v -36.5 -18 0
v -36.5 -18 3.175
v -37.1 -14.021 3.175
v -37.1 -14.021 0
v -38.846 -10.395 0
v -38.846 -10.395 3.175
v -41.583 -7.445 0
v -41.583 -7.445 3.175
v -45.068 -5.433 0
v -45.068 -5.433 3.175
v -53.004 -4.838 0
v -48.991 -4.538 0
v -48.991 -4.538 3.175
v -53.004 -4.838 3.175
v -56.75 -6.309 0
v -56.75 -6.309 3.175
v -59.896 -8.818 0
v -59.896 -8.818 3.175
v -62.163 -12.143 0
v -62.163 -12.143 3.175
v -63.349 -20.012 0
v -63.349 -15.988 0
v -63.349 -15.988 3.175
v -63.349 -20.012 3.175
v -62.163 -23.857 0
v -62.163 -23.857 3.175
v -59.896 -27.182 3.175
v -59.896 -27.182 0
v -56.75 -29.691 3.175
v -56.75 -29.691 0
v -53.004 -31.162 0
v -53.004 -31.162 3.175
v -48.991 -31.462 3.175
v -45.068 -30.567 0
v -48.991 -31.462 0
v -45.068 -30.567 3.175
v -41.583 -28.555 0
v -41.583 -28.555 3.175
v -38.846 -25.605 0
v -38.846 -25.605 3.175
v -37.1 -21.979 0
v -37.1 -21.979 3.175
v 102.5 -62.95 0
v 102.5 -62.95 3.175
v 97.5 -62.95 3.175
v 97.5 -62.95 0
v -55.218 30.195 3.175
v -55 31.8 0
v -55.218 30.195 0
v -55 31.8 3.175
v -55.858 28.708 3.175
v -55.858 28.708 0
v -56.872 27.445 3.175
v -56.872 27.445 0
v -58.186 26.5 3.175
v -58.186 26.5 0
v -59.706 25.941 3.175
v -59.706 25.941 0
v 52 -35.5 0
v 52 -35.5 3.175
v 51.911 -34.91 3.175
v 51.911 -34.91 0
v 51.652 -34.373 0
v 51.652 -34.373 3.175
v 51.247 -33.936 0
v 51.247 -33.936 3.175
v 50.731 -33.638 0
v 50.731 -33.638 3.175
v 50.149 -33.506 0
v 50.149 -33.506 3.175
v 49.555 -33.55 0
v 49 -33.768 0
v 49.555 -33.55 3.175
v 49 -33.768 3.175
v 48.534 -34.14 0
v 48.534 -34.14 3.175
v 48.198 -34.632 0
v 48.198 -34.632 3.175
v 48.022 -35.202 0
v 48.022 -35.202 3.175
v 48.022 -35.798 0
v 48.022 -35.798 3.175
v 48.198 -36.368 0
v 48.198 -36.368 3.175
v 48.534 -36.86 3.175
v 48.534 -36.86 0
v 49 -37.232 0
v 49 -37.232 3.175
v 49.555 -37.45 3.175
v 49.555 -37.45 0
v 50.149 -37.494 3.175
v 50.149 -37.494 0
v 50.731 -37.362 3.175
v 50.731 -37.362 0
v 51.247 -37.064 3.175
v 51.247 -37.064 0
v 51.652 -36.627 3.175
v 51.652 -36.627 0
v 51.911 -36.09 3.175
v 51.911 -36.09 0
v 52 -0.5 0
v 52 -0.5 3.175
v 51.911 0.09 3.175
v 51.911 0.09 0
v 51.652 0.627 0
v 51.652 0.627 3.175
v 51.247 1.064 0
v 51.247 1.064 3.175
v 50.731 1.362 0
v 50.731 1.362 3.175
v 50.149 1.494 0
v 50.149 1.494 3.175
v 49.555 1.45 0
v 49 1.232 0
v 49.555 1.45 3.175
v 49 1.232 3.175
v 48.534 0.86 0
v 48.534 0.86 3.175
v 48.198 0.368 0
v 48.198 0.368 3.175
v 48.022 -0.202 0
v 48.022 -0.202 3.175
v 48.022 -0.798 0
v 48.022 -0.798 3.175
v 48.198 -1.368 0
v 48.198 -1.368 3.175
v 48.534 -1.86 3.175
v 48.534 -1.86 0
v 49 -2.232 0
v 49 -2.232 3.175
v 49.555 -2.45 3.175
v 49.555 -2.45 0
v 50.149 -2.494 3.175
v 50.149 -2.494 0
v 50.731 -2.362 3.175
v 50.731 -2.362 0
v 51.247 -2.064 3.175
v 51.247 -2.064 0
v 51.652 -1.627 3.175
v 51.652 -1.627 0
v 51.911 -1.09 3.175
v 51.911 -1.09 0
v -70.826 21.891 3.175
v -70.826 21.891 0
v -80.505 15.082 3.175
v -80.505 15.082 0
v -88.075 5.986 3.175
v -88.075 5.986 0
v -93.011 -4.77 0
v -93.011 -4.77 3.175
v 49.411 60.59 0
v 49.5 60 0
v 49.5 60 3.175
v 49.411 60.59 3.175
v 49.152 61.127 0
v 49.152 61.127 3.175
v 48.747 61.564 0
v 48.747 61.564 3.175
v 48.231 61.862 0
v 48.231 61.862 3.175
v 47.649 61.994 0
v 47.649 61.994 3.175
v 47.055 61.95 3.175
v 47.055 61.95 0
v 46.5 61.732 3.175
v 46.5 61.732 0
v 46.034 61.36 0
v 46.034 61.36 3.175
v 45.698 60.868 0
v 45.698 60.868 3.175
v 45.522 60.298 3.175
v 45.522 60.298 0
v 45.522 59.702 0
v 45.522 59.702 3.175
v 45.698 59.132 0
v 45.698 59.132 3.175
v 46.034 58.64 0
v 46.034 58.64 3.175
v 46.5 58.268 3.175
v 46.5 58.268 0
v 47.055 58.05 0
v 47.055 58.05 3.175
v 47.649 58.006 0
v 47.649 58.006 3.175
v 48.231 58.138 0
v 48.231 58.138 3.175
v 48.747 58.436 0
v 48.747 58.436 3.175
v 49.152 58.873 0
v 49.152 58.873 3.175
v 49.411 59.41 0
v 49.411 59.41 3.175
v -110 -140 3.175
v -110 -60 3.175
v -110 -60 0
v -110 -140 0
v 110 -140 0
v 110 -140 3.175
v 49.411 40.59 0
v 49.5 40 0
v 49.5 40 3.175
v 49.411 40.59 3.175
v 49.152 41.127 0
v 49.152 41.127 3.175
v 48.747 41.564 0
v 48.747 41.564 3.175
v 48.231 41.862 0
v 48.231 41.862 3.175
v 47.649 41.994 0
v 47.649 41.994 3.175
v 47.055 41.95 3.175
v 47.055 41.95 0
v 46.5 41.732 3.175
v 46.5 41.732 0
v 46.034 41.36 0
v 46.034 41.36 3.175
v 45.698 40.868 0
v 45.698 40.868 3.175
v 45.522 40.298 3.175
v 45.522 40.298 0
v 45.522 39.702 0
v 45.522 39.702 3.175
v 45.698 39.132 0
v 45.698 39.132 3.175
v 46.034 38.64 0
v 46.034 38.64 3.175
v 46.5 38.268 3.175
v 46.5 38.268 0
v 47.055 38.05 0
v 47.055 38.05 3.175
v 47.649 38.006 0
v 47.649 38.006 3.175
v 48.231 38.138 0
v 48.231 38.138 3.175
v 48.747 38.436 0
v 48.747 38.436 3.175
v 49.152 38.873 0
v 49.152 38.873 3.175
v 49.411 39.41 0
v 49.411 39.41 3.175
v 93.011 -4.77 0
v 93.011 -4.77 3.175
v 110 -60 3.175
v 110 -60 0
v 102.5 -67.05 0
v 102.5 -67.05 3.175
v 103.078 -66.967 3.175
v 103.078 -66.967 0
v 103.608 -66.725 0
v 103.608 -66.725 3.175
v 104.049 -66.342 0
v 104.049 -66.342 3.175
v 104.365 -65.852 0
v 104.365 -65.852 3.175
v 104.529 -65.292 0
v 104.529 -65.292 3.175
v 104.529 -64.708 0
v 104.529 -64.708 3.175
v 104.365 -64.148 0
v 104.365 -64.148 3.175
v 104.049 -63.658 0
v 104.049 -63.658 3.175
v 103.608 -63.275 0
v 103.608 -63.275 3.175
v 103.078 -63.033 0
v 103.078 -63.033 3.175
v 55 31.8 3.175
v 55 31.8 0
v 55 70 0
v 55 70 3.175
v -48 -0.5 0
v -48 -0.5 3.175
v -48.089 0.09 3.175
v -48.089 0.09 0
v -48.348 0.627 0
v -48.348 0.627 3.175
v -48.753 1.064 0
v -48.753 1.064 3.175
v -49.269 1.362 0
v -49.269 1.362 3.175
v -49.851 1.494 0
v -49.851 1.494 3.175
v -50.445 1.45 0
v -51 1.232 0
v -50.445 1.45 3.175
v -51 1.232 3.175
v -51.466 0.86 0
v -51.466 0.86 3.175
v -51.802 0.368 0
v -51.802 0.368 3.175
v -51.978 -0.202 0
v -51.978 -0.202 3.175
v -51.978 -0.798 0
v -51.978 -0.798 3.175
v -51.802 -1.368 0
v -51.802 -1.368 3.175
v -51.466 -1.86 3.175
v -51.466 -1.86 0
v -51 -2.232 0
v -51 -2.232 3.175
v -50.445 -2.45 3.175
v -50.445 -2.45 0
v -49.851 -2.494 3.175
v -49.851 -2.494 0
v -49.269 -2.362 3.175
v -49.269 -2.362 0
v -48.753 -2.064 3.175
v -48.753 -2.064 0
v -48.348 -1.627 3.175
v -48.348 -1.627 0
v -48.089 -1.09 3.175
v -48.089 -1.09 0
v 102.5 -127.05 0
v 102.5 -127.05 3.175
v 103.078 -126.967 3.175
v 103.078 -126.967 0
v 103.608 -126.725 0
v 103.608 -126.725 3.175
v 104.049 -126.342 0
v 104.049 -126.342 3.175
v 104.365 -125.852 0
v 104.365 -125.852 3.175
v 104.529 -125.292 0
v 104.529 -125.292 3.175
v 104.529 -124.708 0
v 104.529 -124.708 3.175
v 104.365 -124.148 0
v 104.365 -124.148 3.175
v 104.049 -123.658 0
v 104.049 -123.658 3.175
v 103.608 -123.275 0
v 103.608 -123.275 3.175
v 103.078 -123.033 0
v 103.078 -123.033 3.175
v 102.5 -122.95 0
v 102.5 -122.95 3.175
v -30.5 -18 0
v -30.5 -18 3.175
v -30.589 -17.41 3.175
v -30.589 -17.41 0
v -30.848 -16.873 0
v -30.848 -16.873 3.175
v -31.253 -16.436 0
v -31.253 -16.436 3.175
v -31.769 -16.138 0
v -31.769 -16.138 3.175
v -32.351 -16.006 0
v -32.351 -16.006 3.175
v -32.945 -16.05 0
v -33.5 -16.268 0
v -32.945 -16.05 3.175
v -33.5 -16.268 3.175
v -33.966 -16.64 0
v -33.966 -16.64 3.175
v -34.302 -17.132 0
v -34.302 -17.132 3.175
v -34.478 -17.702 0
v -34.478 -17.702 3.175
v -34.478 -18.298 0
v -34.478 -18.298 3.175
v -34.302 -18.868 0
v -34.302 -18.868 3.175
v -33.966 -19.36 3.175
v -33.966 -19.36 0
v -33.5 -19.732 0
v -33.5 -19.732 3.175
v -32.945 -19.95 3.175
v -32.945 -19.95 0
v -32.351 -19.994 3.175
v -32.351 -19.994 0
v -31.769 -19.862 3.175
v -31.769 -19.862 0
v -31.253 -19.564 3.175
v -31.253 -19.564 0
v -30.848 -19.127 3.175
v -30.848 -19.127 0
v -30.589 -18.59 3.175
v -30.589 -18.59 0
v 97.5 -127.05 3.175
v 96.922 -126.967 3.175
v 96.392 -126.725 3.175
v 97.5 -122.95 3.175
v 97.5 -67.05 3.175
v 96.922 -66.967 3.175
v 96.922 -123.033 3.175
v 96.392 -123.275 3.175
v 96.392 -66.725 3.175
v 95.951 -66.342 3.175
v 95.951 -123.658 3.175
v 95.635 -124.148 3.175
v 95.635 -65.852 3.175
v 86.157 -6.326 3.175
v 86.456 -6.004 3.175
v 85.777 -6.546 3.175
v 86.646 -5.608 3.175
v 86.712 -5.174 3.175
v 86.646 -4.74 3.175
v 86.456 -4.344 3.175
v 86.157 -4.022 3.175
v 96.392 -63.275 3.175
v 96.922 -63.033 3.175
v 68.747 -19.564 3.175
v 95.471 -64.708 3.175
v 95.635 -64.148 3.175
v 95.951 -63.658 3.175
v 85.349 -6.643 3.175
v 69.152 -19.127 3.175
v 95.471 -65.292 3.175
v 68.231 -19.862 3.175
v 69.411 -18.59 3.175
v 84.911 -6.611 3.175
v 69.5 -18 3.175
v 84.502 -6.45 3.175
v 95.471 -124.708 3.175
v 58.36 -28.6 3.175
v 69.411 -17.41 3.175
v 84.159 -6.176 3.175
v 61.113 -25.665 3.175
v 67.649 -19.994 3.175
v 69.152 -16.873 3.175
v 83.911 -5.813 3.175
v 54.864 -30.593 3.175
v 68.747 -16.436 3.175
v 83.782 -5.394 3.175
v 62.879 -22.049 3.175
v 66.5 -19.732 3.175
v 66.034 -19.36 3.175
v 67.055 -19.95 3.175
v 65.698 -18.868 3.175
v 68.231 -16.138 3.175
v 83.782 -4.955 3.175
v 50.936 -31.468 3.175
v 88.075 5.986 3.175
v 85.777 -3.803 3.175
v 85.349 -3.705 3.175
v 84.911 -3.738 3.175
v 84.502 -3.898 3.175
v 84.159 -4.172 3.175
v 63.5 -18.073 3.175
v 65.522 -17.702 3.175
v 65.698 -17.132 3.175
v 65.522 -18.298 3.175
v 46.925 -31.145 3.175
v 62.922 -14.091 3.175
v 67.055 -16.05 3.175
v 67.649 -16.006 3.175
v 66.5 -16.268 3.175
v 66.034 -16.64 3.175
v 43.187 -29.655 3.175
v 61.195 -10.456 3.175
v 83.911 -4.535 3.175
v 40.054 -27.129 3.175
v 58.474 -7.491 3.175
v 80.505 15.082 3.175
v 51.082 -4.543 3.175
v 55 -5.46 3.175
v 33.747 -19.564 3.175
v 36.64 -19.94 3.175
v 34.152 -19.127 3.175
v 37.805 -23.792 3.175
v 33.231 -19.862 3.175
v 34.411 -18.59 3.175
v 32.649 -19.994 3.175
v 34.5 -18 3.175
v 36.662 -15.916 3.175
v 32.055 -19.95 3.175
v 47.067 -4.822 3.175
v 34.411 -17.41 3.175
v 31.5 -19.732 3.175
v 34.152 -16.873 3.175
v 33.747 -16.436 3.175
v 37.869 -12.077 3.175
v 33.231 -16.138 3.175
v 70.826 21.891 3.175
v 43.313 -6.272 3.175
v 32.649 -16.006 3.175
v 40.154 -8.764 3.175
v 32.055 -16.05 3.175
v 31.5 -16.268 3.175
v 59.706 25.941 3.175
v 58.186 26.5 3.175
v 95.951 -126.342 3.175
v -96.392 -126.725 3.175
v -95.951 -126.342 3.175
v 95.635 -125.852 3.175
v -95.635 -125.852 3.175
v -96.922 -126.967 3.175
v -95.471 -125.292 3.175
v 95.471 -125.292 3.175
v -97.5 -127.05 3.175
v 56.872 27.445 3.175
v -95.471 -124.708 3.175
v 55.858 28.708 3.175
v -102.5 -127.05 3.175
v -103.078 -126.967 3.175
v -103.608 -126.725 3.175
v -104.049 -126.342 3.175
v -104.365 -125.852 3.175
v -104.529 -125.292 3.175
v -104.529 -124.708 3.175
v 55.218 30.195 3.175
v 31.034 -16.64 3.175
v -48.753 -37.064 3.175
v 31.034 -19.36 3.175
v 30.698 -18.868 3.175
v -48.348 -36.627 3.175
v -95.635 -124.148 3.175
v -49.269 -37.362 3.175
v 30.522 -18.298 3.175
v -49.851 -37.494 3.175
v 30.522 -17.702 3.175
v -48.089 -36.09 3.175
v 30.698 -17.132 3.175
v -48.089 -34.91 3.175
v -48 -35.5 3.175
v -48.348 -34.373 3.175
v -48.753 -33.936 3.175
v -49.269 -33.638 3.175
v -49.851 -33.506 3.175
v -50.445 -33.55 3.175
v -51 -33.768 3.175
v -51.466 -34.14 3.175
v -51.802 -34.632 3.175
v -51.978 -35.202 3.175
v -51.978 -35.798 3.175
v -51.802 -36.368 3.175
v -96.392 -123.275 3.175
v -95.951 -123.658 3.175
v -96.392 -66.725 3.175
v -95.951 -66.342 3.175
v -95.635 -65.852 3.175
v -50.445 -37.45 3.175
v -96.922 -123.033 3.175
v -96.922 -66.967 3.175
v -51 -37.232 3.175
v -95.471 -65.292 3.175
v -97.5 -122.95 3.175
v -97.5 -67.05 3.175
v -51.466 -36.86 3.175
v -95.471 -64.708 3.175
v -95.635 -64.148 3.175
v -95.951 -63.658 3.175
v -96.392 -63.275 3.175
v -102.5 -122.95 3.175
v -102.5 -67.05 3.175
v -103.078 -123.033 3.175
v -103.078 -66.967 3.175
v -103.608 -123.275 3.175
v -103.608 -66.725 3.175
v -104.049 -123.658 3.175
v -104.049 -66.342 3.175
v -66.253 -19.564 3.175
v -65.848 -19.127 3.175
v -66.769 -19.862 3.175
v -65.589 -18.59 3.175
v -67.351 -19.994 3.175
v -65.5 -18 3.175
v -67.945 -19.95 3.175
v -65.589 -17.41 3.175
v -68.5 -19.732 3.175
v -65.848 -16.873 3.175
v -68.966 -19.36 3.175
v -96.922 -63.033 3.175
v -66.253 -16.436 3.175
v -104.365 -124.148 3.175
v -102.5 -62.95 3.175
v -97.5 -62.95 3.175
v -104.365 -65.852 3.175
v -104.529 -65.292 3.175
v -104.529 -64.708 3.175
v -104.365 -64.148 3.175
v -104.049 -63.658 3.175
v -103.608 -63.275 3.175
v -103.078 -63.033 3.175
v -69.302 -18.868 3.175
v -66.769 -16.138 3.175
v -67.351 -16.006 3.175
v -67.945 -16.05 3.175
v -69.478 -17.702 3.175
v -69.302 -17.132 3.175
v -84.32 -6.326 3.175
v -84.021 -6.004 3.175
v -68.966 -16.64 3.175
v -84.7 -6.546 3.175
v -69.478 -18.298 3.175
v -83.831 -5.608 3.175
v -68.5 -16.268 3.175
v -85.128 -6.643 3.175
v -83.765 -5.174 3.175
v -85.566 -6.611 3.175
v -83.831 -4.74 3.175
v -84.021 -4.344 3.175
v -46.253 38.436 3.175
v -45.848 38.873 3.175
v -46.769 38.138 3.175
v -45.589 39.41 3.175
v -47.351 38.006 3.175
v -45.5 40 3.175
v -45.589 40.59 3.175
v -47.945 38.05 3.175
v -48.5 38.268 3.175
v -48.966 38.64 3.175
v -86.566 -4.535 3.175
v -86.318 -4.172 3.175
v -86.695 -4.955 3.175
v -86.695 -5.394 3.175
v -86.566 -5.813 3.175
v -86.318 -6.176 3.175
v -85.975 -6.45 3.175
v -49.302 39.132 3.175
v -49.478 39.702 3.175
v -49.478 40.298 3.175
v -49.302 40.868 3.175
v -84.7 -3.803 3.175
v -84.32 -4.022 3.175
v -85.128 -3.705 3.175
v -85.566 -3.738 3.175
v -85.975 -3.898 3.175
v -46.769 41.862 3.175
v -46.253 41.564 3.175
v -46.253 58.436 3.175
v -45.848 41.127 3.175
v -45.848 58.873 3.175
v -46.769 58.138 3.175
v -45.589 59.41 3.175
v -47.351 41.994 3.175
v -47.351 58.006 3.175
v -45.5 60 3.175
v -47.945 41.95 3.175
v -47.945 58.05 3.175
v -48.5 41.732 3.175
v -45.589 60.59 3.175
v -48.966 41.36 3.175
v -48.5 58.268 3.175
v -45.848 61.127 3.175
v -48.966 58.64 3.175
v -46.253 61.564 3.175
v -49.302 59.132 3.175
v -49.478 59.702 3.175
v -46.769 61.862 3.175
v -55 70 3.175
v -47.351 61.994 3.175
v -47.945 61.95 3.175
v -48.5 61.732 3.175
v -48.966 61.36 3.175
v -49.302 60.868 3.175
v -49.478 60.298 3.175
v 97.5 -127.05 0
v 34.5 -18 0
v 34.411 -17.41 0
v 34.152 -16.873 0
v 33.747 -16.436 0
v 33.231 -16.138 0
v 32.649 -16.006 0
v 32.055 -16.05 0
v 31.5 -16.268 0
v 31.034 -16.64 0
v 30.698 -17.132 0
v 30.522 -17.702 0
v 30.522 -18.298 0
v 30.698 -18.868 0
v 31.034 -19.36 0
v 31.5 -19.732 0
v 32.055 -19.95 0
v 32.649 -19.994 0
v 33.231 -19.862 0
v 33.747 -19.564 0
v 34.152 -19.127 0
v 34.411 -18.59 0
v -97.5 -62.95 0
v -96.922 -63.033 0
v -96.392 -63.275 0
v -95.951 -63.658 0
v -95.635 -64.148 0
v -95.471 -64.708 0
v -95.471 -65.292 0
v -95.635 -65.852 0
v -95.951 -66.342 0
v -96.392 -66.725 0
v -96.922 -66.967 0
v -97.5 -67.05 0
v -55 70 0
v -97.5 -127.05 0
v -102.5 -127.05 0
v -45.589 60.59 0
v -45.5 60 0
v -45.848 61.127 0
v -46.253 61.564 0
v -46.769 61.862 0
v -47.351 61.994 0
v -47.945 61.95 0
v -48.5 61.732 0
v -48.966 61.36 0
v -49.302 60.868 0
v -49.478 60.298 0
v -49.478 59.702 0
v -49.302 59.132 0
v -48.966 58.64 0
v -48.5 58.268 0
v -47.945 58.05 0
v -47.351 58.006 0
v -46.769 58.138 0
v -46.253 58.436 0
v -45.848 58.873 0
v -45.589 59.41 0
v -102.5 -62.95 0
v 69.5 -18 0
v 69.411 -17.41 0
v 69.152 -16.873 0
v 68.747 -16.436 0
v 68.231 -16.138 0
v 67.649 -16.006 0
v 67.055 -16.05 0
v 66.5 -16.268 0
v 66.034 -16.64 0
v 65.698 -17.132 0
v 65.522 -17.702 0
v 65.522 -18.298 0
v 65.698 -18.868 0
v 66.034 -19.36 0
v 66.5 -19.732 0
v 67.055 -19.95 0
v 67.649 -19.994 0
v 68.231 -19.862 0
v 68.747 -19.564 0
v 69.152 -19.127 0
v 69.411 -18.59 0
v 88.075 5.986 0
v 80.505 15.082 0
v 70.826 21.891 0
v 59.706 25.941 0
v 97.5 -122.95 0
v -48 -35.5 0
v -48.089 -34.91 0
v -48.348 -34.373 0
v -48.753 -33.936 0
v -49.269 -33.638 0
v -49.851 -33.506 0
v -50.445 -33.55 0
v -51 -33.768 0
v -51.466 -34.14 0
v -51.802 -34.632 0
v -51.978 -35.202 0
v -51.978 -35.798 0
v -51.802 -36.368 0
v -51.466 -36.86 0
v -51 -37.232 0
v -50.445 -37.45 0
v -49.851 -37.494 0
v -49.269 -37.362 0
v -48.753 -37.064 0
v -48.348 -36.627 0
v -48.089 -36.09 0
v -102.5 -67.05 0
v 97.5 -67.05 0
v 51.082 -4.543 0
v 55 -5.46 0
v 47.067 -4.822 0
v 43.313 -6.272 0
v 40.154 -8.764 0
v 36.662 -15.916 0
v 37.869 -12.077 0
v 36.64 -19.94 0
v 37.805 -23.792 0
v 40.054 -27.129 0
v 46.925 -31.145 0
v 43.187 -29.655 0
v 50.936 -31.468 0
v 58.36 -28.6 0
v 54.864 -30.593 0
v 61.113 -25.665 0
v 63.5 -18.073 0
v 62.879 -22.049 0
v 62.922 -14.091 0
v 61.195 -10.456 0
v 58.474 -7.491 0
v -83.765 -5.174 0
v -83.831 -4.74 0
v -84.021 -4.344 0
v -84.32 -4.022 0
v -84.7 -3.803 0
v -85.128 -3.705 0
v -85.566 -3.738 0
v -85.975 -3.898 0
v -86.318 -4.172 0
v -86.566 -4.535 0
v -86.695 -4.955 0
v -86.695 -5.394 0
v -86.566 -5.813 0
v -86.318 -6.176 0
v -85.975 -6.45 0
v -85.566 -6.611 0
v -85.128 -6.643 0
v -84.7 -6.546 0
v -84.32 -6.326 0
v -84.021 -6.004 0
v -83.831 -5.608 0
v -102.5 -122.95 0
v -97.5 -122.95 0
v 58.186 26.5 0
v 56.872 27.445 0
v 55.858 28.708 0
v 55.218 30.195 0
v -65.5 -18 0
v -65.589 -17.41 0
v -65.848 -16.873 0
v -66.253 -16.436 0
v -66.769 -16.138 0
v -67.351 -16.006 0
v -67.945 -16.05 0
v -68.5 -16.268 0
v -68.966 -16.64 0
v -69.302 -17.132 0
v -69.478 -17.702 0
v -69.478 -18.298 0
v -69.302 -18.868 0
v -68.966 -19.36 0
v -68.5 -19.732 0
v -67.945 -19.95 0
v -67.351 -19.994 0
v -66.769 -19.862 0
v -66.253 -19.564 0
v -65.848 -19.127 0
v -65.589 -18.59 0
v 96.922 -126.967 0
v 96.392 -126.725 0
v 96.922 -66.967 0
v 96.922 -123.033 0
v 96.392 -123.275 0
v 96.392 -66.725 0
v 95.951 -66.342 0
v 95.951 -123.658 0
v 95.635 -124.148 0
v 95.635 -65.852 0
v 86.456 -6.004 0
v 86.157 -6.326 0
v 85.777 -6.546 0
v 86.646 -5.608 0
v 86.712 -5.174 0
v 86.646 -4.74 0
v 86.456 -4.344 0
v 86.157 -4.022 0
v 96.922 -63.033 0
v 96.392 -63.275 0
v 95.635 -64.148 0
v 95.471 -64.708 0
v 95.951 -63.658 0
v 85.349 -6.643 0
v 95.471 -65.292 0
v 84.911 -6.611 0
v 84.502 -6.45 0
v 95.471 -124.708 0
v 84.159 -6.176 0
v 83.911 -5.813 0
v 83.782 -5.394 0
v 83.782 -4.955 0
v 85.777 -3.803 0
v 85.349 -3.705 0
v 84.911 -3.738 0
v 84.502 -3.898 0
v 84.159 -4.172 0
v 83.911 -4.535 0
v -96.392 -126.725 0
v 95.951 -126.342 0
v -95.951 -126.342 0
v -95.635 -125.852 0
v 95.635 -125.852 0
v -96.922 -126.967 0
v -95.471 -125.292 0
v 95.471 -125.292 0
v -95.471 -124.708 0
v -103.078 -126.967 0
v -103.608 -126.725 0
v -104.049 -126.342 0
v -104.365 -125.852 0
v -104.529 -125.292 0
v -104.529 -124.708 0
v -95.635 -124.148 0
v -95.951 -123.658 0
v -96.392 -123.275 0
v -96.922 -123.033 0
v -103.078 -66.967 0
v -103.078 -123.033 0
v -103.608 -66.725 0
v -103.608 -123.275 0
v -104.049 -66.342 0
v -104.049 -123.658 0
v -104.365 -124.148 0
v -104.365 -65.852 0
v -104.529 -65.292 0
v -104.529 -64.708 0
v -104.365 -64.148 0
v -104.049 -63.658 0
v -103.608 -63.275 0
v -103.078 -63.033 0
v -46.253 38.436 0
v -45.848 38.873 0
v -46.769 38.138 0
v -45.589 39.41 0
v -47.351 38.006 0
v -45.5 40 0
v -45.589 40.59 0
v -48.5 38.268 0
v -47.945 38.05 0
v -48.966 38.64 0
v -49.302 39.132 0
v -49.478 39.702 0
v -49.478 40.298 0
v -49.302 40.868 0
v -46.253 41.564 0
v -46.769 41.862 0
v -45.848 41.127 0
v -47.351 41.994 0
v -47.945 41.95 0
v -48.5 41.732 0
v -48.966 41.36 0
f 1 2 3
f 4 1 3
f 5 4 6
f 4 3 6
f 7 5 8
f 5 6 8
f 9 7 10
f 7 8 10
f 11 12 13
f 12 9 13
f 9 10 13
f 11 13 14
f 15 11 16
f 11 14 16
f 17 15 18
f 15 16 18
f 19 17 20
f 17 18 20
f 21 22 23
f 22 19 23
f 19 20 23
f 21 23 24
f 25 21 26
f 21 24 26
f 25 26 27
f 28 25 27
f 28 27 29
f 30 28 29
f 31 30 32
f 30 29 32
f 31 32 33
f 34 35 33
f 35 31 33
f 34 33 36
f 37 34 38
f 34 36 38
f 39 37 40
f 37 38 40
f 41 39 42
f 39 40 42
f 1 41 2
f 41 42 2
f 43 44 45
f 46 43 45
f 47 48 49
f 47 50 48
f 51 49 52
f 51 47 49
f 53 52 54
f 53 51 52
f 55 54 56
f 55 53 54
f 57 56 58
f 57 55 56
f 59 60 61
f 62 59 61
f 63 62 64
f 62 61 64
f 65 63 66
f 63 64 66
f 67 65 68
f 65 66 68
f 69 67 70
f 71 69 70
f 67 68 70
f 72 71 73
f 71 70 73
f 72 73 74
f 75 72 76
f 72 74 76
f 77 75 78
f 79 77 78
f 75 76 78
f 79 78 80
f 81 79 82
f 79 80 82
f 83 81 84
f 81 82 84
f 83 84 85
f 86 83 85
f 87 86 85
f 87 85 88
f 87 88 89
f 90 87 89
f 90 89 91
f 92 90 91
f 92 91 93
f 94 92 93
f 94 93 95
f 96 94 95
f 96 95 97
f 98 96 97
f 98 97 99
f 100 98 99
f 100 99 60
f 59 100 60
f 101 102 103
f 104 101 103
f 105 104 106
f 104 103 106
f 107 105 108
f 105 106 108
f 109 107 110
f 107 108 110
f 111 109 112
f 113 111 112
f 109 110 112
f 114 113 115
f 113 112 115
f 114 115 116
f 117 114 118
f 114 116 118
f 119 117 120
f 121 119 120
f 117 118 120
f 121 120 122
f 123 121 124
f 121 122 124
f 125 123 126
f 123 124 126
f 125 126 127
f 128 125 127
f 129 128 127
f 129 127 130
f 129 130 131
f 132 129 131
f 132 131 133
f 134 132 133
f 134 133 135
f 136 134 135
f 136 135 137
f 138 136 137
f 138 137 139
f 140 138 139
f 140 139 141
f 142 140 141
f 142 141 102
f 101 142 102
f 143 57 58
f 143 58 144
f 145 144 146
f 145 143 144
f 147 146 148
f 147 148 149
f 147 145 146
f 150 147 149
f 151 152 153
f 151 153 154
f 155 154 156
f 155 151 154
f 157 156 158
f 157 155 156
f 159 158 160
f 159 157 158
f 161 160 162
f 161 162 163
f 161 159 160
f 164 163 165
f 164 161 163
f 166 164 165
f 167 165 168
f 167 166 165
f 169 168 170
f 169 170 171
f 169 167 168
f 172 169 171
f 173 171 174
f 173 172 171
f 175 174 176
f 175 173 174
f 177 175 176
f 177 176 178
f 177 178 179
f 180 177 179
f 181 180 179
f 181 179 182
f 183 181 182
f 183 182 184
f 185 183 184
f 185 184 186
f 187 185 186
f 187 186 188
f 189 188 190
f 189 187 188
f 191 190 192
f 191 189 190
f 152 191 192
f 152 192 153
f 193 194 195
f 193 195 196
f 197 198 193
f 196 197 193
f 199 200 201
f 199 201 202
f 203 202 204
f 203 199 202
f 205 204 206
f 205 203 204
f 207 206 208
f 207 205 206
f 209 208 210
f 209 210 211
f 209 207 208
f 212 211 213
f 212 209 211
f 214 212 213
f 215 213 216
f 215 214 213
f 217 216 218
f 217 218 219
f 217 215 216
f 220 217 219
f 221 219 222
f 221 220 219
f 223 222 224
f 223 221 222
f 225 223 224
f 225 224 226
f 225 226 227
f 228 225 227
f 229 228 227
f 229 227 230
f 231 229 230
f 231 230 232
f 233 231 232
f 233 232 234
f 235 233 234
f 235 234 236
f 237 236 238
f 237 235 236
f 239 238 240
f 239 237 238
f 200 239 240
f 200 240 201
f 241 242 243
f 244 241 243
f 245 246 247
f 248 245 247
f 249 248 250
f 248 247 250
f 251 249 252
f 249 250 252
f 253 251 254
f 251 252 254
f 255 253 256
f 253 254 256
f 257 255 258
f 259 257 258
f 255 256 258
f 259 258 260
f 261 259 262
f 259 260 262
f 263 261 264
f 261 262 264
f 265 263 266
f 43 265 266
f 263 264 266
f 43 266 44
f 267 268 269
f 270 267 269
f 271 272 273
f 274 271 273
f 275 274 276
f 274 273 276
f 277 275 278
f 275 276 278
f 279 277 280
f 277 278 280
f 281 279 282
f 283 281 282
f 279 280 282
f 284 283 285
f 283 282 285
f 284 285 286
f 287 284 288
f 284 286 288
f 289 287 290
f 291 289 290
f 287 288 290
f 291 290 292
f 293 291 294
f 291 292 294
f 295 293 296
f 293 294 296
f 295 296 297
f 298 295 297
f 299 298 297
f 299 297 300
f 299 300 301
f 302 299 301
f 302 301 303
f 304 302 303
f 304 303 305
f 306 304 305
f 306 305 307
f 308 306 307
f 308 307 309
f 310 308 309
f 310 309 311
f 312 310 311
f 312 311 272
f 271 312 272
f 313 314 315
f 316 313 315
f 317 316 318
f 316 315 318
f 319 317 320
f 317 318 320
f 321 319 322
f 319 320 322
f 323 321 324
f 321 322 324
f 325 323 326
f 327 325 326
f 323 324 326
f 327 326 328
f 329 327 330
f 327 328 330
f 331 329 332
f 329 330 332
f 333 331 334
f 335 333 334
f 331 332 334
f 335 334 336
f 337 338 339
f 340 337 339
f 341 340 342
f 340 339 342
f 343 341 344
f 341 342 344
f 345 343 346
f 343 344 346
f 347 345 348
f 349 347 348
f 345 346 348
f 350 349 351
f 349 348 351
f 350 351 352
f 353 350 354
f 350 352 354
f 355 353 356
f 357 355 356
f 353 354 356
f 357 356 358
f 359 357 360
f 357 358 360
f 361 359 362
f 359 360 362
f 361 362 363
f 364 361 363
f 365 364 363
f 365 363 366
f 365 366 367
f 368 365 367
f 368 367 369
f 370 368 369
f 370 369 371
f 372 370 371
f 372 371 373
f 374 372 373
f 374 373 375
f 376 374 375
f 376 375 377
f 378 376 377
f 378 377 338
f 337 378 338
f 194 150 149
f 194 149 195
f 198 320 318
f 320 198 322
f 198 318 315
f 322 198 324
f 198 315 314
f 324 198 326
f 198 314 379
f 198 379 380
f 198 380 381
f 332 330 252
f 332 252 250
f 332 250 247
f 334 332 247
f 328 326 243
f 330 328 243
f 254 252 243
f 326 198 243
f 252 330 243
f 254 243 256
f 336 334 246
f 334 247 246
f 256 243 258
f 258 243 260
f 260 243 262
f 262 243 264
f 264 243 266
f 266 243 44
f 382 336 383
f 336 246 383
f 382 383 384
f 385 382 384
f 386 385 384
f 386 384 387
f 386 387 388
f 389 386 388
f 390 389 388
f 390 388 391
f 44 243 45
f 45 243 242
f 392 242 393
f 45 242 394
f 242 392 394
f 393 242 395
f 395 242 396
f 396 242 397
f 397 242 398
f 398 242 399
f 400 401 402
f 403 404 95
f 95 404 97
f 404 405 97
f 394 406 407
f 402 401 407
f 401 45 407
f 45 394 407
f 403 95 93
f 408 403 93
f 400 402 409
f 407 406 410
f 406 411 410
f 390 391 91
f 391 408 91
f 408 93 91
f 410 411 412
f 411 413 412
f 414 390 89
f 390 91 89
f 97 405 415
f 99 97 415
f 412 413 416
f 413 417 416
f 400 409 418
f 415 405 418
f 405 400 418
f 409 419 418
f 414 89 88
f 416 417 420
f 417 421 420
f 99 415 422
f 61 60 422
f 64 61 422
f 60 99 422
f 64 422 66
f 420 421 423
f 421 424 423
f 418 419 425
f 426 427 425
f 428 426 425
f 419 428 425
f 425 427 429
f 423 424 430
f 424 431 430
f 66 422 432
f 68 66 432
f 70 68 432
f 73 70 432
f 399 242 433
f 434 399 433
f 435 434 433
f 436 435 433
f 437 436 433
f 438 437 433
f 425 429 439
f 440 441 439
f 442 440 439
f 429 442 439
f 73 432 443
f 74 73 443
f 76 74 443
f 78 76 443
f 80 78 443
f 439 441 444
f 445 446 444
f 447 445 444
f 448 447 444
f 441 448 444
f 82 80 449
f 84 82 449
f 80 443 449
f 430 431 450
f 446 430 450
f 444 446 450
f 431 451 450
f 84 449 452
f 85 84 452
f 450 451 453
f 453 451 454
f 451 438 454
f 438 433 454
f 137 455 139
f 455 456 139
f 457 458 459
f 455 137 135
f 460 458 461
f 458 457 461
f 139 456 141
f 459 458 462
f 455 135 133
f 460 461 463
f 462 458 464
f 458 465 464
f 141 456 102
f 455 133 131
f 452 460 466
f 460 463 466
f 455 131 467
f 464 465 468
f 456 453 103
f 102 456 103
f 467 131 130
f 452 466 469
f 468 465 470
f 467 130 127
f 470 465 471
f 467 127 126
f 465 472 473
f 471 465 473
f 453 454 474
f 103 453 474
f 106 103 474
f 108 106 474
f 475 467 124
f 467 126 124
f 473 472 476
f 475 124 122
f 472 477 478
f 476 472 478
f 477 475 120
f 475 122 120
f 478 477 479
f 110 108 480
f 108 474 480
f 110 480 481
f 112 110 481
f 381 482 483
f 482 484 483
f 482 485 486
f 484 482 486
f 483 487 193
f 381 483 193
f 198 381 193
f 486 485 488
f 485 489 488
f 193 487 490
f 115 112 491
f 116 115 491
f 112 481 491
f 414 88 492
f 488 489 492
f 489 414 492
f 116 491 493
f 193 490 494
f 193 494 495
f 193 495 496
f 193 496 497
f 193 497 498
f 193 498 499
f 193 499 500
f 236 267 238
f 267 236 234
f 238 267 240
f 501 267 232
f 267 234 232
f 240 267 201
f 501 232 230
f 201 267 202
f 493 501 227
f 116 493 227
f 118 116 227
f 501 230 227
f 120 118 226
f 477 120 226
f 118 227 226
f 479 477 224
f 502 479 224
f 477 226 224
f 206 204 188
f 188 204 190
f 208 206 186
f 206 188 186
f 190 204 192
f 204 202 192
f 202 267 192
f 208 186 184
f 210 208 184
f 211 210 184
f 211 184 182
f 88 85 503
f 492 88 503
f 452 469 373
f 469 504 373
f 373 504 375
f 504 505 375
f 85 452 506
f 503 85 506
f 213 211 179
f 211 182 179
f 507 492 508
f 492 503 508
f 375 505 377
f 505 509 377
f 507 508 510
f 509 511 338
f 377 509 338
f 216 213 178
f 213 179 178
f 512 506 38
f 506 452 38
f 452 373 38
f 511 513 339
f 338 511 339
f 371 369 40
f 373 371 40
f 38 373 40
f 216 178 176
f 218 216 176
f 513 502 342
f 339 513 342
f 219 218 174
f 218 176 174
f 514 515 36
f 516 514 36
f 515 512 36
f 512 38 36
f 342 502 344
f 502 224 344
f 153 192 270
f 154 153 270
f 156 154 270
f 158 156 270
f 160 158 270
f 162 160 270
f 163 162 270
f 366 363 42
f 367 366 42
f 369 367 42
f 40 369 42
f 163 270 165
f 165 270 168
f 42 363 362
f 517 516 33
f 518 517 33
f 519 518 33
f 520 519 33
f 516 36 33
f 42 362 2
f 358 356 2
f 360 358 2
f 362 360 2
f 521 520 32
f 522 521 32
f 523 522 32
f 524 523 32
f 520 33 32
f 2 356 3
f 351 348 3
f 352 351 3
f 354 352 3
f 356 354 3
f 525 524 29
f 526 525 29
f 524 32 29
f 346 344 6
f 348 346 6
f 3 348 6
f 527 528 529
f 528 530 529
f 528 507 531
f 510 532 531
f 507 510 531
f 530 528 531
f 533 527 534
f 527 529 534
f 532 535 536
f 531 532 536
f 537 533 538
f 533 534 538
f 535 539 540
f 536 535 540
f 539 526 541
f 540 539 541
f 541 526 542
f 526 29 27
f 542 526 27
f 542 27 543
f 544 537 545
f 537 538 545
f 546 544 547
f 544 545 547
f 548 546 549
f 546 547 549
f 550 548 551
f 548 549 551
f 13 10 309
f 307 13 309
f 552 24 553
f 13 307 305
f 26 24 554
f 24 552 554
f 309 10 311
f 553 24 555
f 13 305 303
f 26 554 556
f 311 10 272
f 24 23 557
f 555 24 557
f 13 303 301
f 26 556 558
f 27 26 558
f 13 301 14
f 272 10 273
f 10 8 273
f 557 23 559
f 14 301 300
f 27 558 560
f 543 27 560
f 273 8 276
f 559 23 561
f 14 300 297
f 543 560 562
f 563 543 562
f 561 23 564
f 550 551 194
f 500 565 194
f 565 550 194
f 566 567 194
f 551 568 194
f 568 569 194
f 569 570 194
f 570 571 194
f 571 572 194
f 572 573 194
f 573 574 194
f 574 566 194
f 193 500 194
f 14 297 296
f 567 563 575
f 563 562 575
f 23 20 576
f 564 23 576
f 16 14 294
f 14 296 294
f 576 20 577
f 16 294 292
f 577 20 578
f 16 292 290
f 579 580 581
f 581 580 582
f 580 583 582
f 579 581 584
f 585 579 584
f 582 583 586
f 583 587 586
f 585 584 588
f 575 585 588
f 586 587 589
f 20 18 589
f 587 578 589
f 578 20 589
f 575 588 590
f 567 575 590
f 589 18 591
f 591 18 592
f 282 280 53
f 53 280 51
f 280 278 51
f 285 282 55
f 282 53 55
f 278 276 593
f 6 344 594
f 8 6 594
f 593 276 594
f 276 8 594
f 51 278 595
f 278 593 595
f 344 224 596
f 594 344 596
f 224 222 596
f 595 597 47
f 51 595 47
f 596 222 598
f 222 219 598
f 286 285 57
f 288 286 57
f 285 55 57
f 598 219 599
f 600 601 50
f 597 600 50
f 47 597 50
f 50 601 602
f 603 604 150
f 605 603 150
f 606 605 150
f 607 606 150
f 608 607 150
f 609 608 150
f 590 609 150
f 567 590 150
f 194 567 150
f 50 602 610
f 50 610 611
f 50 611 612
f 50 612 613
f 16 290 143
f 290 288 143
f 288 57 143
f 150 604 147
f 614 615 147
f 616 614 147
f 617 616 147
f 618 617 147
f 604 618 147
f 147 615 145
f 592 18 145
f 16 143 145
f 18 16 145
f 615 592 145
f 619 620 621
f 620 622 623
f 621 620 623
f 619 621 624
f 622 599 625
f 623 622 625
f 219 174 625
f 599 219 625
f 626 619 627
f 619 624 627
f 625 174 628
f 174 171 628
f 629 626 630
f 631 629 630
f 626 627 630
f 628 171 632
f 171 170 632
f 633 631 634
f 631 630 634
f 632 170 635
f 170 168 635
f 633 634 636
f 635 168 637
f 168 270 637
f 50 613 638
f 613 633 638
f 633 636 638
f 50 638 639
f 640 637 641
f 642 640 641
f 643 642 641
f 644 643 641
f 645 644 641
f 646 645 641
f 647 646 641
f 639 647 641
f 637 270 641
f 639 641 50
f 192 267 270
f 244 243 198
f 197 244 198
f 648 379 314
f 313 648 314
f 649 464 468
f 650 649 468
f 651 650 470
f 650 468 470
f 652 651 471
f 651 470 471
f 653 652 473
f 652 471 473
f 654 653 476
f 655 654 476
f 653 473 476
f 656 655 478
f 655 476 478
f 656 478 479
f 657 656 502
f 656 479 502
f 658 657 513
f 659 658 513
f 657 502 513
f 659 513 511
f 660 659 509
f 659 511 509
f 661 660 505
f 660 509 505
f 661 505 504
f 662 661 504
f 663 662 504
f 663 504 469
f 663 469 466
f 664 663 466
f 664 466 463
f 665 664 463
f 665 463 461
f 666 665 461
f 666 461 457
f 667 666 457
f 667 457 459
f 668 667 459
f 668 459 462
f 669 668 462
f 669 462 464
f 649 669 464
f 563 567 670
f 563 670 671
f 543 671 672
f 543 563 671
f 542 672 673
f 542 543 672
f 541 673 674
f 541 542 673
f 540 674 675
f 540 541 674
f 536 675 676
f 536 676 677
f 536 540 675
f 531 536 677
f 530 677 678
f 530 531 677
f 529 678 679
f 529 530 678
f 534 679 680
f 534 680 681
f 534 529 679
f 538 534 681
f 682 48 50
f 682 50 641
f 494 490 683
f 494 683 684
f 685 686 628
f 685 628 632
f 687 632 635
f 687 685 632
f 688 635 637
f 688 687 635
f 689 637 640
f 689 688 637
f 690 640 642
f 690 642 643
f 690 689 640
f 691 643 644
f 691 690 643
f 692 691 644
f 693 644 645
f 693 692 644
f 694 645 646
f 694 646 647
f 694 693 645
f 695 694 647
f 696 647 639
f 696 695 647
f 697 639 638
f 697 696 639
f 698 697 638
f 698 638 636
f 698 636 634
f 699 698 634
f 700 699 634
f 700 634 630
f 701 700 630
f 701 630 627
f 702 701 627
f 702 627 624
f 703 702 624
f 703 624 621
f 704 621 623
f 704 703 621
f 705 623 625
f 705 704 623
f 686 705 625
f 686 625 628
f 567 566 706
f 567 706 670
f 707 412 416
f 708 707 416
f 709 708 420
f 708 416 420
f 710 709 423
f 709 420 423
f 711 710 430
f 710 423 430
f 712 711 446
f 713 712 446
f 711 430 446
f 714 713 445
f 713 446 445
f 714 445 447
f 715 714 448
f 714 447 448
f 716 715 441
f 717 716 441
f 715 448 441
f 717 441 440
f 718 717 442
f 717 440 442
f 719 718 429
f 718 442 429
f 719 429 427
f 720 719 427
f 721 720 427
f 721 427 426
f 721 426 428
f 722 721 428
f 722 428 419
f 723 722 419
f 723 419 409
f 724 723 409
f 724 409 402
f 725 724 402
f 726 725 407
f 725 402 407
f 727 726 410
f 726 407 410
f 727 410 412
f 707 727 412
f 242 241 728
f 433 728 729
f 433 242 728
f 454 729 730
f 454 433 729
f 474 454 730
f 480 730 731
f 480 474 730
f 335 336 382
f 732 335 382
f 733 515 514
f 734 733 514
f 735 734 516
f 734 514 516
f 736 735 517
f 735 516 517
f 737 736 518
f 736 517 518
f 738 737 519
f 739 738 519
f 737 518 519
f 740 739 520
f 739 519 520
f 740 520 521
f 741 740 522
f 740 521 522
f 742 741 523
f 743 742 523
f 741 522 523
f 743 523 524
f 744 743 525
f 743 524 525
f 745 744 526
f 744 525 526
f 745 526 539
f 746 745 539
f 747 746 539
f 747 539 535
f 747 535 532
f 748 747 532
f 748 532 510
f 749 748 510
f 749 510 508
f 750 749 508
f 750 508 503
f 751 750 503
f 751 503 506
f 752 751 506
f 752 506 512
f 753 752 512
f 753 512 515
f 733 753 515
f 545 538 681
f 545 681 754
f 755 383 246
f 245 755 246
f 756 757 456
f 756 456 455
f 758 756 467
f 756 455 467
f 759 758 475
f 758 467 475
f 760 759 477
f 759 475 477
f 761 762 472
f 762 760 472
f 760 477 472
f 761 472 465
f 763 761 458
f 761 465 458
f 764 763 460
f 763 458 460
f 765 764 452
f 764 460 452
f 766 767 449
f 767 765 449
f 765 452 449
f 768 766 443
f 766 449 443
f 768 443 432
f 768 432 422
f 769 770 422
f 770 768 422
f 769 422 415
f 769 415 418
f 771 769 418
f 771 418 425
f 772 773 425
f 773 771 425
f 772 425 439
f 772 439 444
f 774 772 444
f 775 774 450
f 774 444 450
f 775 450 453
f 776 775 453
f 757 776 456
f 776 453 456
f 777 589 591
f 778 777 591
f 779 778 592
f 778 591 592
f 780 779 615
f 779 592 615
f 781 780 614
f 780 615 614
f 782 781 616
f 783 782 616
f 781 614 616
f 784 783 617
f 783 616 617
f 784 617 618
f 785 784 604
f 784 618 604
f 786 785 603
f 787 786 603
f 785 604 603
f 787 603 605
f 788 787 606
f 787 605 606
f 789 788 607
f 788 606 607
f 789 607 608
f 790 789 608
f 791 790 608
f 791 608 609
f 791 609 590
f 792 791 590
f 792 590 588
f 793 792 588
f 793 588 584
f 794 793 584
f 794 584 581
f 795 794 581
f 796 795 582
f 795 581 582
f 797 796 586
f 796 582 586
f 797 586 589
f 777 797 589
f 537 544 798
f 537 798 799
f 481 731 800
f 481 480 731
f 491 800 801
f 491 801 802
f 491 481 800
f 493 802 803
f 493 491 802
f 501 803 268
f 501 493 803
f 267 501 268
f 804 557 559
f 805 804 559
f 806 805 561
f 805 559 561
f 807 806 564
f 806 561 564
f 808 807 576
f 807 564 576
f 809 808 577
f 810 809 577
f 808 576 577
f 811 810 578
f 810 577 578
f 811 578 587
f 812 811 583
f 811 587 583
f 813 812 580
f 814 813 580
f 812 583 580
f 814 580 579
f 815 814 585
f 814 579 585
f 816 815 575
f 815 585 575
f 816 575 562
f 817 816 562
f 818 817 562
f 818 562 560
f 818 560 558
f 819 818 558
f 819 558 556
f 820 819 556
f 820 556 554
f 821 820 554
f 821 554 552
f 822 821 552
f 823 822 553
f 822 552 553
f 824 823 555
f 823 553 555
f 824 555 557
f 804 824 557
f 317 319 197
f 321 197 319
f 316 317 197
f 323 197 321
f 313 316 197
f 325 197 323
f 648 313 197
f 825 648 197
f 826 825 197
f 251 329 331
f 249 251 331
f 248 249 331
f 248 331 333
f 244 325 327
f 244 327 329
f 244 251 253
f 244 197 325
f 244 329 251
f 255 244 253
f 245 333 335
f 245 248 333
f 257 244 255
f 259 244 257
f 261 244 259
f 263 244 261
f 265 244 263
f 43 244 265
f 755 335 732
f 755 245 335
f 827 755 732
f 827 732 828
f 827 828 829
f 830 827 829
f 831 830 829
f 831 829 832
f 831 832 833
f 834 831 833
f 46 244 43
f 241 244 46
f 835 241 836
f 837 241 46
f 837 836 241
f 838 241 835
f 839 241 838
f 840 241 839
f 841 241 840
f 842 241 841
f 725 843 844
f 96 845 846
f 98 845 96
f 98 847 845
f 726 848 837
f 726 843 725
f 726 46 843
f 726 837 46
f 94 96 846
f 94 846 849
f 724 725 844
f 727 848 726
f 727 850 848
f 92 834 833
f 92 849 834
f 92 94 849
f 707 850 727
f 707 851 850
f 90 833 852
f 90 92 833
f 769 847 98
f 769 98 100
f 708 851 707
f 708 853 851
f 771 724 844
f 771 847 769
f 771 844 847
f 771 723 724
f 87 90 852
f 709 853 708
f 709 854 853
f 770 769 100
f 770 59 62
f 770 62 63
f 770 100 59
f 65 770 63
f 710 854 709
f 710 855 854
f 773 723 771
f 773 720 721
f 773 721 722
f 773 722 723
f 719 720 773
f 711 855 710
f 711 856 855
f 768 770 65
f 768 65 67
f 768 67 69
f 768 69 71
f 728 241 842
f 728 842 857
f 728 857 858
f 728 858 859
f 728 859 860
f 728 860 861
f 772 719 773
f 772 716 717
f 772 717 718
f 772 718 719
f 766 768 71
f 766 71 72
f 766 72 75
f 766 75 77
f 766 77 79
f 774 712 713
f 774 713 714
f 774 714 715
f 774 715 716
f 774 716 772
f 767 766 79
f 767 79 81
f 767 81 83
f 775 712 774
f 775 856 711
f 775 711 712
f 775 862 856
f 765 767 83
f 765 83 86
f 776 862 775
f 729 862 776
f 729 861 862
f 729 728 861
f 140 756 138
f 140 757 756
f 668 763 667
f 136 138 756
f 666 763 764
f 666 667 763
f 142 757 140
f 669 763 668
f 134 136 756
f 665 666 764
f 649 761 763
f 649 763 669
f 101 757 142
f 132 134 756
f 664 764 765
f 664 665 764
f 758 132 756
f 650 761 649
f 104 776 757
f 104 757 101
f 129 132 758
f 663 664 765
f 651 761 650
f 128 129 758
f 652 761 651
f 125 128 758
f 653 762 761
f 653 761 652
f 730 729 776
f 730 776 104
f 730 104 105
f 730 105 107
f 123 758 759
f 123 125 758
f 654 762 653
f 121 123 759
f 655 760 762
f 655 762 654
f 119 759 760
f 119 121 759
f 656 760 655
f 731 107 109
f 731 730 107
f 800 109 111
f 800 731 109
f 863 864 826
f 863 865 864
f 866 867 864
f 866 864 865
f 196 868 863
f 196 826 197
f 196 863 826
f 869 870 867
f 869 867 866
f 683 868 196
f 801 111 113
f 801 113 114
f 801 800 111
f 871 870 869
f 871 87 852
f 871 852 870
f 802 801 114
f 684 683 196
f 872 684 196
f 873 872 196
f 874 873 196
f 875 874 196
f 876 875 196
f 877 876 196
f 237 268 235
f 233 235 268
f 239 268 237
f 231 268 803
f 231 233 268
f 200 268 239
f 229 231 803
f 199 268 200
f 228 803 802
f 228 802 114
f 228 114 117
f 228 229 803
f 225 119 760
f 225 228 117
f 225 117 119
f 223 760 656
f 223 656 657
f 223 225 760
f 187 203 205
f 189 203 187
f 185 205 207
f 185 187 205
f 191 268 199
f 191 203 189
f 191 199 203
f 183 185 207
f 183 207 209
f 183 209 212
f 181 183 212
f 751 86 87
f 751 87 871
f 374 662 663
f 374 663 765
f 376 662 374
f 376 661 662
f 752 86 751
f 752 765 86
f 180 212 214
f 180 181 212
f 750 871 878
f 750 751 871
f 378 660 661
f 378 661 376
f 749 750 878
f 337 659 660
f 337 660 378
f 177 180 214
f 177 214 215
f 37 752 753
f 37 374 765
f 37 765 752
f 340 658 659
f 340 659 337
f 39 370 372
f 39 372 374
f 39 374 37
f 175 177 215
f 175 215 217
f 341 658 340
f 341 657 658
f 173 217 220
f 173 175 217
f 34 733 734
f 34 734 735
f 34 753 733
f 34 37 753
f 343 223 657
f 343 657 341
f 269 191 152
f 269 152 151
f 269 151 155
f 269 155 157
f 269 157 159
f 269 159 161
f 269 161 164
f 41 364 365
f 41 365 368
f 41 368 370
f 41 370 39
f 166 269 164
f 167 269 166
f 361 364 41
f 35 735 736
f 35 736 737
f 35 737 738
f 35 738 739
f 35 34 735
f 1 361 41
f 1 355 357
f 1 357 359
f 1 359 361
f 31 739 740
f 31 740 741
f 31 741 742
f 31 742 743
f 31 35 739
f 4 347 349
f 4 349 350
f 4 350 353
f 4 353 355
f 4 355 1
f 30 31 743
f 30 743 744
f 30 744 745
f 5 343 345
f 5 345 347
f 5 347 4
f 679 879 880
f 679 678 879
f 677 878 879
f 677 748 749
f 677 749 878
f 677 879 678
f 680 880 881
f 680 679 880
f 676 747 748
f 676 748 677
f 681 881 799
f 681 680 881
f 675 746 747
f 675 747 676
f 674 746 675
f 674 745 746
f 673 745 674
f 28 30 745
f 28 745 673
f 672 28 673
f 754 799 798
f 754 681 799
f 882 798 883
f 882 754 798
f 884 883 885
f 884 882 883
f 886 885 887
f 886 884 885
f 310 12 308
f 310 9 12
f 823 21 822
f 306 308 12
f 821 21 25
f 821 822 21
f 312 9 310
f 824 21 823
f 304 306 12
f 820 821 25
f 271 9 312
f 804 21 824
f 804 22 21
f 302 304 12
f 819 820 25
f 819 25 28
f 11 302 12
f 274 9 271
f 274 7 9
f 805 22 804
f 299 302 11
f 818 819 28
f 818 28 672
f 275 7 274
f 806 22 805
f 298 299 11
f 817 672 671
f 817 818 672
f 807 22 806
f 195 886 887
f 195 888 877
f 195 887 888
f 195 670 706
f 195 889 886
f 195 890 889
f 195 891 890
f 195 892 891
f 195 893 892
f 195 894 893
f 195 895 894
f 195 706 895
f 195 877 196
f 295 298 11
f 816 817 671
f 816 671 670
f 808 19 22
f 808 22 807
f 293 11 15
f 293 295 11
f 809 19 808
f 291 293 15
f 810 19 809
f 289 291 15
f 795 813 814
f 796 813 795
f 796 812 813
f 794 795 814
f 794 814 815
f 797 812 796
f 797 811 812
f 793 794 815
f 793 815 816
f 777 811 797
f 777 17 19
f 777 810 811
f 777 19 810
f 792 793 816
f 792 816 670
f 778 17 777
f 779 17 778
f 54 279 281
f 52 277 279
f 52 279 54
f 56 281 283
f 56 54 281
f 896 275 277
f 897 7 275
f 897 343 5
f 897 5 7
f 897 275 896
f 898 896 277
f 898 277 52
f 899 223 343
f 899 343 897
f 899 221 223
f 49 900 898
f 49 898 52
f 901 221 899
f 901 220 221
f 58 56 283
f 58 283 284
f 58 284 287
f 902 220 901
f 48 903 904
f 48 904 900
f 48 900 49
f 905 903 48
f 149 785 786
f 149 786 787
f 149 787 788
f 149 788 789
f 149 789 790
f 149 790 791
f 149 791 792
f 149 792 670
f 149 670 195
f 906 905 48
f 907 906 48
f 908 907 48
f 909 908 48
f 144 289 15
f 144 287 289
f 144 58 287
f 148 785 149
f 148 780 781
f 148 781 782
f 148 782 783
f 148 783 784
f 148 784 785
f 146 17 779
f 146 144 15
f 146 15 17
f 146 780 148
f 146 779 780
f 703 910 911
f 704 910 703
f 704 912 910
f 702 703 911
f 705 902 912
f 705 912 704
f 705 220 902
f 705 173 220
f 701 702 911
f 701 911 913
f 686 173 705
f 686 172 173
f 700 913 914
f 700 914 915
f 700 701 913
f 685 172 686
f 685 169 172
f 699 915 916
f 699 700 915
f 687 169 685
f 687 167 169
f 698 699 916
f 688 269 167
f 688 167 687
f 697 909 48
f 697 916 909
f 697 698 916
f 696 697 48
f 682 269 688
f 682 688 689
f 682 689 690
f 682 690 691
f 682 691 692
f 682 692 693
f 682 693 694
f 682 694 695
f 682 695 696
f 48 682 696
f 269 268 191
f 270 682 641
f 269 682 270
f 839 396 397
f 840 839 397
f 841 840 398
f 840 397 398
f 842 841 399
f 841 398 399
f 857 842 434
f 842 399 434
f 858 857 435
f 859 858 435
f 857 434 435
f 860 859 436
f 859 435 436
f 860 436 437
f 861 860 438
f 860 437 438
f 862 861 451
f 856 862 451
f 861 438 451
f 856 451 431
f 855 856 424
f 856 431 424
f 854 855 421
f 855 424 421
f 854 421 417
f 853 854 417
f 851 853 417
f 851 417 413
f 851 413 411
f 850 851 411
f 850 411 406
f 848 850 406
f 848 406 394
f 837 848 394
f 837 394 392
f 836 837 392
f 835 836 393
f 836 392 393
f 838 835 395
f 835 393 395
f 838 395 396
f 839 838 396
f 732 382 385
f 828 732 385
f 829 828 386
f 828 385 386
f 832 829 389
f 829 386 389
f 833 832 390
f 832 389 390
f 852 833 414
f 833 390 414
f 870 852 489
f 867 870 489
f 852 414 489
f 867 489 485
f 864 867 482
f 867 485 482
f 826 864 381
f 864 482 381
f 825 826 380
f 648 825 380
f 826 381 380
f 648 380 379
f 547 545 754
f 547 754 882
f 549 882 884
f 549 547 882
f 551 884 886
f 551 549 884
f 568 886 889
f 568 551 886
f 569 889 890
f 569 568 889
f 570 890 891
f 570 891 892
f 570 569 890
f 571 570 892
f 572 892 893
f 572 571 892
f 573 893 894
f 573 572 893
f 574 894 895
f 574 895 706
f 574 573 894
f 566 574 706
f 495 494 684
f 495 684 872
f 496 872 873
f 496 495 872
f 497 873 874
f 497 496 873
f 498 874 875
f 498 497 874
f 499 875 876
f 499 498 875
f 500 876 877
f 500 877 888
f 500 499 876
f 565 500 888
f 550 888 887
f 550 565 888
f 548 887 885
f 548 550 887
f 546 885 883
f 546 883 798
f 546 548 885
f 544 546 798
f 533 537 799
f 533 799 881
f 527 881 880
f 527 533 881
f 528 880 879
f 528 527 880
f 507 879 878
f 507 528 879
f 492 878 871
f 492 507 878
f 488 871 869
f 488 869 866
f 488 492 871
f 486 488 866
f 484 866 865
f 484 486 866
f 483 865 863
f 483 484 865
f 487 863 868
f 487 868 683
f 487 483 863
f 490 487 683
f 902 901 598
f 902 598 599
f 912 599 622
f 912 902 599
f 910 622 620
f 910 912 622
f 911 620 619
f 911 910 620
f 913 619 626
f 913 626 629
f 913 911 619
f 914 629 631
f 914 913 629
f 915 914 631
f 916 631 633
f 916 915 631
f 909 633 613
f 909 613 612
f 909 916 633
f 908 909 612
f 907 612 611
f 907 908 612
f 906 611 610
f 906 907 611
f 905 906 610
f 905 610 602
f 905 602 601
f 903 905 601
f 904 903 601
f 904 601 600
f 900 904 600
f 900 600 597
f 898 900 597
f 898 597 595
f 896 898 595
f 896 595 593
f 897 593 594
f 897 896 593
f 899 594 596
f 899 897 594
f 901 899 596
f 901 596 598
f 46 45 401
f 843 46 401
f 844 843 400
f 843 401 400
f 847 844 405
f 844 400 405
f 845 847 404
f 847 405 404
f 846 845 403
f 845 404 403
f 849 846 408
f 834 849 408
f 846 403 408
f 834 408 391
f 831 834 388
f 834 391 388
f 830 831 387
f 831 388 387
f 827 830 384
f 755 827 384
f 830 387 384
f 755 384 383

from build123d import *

# Parameters (mm, degrees)
SKETCH1_W           = 110
SKETCH1_H           = 140
SKETCH1_R           = 2
BOSS_EXTRUDE1_DEPTH = 3.175
SKETCH3_R           = 45
SKETCH3_R_2         = 2
SKETCH3_R_3         = 13.5
SKETCH3_R_4         = 1.4732
BOSS_EXTRUDE3_DEPTH = 3.175
SKETCH4_W           = 110
SKETCH4_H           = 10
BOSS_EXTRUDE5_DEPTH = 3.175
FILLET1_R           = 6
SKETCH6_R           = 2
SKETCH6_R_2         = 13.5
CUT_EXTRUDE1_DEPTH  = 10


with BuildPart() as part:
    # Sketch1 → Boss-Extrude1 (new body)
    with BuildSketch(Plane.XY):
        Rectangle(SKETCH1_W, SKETCH1_H)
        with Locations((-47.5, 40)):
            Circle(SKETCH1_R, mode=Mode.SUBTRACT)
        with Locations((47.5, 40)):
            Circle(SKETCH1_R, mode=Mode.SUBTRACT)
        with Locations((-47.5, 60)):
            Circle(SKETCH1_R, mode=Mode.SUBTRACT)
        with Locations((47.5, 60)):
            Circle(SKETCH1_R, mode=Mode.SUBTRACT)
    extrude(amount=BOSS_EXTRUDE1_DEPTH)

    # Sketch3 → Boss-Extrude3 (add)
    # profile 1 of 2: a face of its own
    with BuildSketch(Plane.XY.offset(3.175)):
        with Locations((-50, -18)):
            Circle(SKETCH3_R)
        with Locations((-67.5, -18)):
            Circle(SKETCH3_R_2, mode=Mode.SUBTRACT)
        with Locations((-50, -18)):
            Circle(SKETCH3_R_3, mode=Mode.SUBTRACT)
        with Locations((-85.238473279, -5.174244625)):
            Circle(SKETCH3_R_4, mode=Mode.SUBTRACT)
    # profile 2 of 2: a face of its own
    with BuildSketch(Plane.XY.offset(3.175)):
        with Locations((50, -18)):
            Circle(SKETCH3_R)
        with Locations((67.5, -18)):
            Circle(SKETCH3_R_2, mode=Mode.SUBTRACT)
        with Locations((50, -18)):
            Circle(SKETCH3_R_3, mode=Mode.SUBTRACT)
        with Locations((85.238473279, -5.174244625)):
            Circle(SKETCH3_R_4, mode=Mode.SUBTRACT)
    extrude(amount=-BOSS_EXTRUDE3_DEPTH)

    # Sketch4 → Boss-Extrude5 (add)
    # profile 1 of 4: a face of its own
    with BuildSketch(Plane.XY.offset(3.175)):
        with BuildLine():
            ThreePointArc((-60, -61.874821937), (-63.111300905, -61.047575873), (-66.155494421, -60))
            Line((-66.155494421, -60), (-110, -60))
            Line((-110, -60), (-110, -130))
            Line((-110, -130), (-60, -130))
            Line((-60, -130), (-60, -121.715728753))
            Line((-60, -121.715728753), (-60, -61.874821937))
        make_face()
        with BuildLine():
            Line((-102.5, -122.95), (-97.5, -122.95))
            ThreePointArc((-97.5, -122.95), (-95.45, -125), (-97.5, -127.05))
            Line((-97.5, -127.05), (-102.5, -127.05))
            ThreePointArc((-102.5, -127.05), (-104.55, -125), (-102.5, -122.95))
        make_face(mode=Mode.SUBTRACT)
        with BuildLine():
            ThreePointArc((-97.5, -62.95), (-95.45, -65), (-97.5, -67.05))
            Line((-97.5, -67.05), (-102.5, -67.05))
            ThreePointArc((-102.5, -67.05), (-104.55, -65), (-102.5, -62.95))
            Line((-102.5, -62.95), (-97.5, -62.95))
        make_face(mode=Mode.SUBTRACT)
    # profile 2 of 4: a face of its own
    with BuildSketch(Plane.XY.offset(3.175)):
        with BuildLine():
            Line((-110, -60), (-66.155494421, -60))
            ThreePointArc((-66.155494421, -60), (-90.46935182, -37.678200204), (-93.011169428, -4.76975796))
            Line((-93.011169428, -4.76975796), (-110, -60))
        make_face()
    # profile 3 of 4: a face of its own
    with BuildSketch(Plane.XY.offset(3.175)):
        with BuildLine():
            ThreePointArc((-55, -62.72135955), (-57.51193427, -62.368579462), (-60, -61.874821937))
            Line((-60, -61.874821937), (-60, -121.715728753))
            Line((-60, -121.715728753), (-60, -130))
            Line((-60, -130), (0, -130))
            Line((0, -130), (0, -70))
            Line((0, -70), (-55, -70))
            Line((-55, -70), (-55, -62.72135955))
        make_face()
    # profile 4 of 4: a face of its own
    with BuildSketch(Plane.XY.offset(3.175)):
        with Locations((-55, -135)):
            Rectangle(SKETCH4_W, SKETCH4_H)
    boss_extrude5 = extrude(amount=-BOSS_EXTRUDE5_DEPTH)

    # Mirror2: Boss-Extrude5 across plane
    add(boss_extrude5.mirror(Plane(origin=(0, 0, 0), x_dir=(0, 0, 1), z_dir=(1, 0, 0))))

    # Fillet1
    fillet1_edges = [part.edges().sort_by_distance(p)[0] for p in [
        (-55, 26.72135955, 1.5875),
        (55, 26.72135955, 1.5875),
    ]]
    fillet(fillet1_edges, radius=FILLET1_R)

    # Sketch6 → Cut-Extrude1 (cut)
    with BuildSketch(Plane.XY.offset(3.175)):
        with Locations((32.5, -18)):
            Circle(SKETCH6_R)
        with Locations((50, -0.5)):
            Circle(SKETCH6_R)
        with Locations((67.5, -18)):
            Circle(SKETCH6_R)
        with Locations((50, -18)):
            Circle(SKETCH6_R_2)
        with Locations((50, -35.5)):
            Circle(SKETCH6_R)
        with Locations((-50, -18)):
            Circle(SKETCH6_R_2)
        with Locations((-67.5, -18)):
            Circle(SKETCH6_R)
        with Locations((-50, -35.5)):
            Circle(SKETCH6_R)
        with Locations((-32.5, -18)):
            Circle(SKETCH6_R)
        with Locations((-50, -0.5)):
            Circle(SKETCH6_R)
    extrude(amount=-CUT_EXTRUDE1_DEPTH, mode=Mode.SUBTRACT)


solid = part.part
